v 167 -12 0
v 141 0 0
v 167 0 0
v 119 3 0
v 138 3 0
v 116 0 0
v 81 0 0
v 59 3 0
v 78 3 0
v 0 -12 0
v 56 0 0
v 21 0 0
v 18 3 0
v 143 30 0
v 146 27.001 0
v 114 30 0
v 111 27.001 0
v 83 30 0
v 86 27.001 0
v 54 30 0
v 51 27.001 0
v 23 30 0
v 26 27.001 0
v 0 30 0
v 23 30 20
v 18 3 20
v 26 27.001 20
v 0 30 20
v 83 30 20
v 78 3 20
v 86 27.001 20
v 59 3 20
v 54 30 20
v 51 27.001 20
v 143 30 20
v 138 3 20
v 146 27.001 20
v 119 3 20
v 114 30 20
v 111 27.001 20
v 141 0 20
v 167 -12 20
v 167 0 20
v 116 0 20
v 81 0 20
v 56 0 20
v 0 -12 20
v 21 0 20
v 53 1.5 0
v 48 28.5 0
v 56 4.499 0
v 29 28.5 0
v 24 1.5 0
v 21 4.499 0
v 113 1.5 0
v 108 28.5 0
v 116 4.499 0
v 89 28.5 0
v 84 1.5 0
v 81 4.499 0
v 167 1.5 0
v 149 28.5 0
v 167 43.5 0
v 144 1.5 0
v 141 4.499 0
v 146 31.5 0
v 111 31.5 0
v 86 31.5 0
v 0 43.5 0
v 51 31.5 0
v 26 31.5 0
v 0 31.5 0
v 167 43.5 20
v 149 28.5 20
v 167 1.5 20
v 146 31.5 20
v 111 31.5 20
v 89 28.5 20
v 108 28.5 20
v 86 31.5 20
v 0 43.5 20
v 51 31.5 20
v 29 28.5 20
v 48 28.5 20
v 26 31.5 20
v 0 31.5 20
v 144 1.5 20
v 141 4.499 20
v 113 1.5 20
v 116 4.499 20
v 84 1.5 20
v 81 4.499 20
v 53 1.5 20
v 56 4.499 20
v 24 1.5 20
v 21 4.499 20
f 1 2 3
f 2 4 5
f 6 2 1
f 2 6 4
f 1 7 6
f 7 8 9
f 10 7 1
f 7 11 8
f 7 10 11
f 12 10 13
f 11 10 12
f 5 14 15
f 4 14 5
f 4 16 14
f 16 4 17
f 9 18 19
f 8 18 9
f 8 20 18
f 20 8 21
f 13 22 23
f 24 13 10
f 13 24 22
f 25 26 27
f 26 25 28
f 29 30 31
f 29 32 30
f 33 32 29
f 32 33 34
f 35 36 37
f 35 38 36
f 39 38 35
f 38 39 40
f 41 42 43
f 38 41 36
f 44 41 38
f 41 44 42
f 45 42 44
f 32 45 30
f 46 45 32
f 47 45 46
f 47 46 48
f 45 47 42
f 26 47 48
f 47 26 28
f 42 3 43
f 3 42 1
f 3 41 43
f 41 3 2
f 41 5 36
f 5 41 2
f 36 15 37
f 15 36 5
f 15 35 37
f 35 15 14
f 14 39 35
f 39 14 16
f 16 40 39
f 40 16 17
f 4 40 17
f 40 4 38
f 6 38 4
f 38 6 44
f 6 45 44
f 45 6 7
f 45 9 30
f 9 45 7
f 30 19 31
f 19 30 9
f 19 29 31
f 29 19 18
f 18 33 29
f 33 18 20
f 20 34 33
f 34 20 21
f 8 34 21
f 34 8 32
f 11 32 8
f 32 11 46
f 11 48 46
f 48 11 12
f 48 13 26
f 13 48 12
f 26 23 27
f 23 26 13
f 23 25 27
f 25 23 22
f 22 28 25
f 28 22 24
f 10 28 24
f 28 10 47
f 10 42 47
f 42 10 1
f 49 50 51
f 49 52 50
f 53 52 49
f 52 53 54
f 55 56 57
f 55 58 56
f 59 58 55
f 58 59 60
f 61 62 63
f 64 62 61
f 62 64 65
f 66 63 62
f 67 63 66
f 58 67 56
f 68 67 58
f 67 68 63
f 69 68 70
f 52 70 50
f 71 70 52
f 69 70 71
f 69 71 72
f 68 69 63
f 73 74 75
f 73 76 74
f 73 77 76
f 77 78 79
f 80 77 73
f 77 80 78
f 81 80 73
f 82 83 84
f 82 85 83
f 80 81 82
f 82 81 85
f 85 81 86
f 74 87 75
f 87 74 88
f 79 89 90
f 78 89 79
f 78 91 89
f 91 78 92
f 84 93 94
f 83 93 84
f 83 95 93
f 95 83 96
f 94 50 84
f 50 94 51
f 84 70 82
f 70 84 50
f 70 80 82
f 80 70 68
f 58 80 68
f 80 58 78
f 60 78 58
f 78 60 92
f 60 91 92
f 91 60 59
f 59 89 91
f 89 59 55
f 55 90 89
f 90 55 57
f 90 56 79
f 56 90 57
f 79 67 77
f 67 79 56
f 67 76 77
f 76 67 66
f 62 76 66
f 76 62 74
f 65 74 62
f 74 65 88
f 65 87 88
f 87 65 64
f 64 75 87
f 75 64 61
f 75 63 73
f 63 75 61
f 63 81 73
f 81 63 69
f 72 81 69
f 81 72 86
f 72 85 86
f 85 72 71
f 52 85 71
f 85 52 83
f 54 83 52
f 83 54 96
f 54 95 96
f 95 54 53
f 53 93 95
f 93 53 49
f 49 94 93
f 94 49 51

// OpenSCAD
tail_length = 30;
base_width = 17;
overhang_width = 10;
tails=2;
chamf = 4;
e = 0.001;
tol= 3;
anchor_length = 12;
step_width = (2*base_width+ 2*overhang_width + 2*tol);


module dove_overhang() {
    points = [
        [0,0],
        [0,tail_length],
        [overhang_width,tail_length],
    ];
    points_chamf  = [
        [overhang_width+e,tail_length+e],
        [overhang_width+e,tail_length-chamf+e],
        [overhang_width-chamf-e,tail_length+e]];
    points_chamf_base= [
        [0,chamf],
        [0,0],
        [chamf,0]];
    difference(){
        polygon(points);
        polygon(points_chamf);
    }  
    polygon(points_chamf_base);
}


module dove_body(){
    polygon([
        [0,0],
        [0,tail_length],
        [base_width,tail_length],
        [base_width,0]
    ]);  
}

module dove_tail(){
    translate([overhang_width,0])
    dove_body();
    translate([overhang_width+base_width,0])
    dove_overhang();

    mirror([1,0,0])
    translate([-overhang_width,0])
    dove_overhang();
}

module dove_tail_end(){
    dove_body();
    translate([base_width,0])
    dove_overhang();
}

module tailrow(inner_tail_count){
    for(i=[0:inner_tail_count-1]){
        translate([i* step_width , 0, 0])
        dove_tail();
    }
}

module side (has_end, has_start, inner_tail_count){
    // todo: depending on "has_end" and "has_start" the total width should vary
    
    total_width = 2*base_width + 1*overhang_width + 1*tol 
                + inner_tail_count*step_width;
    
    if (has_start){
        translate([0,0,0])
        dove_tail_end();
        
        translate([1*overhang_width +2* base_width +2* tol ,0,0])
        tailrow(inner_tail_count);
    }else {
        translate([ base_width + tol ,0,0])
        tailrow(inner_tail_count);
    }
    
    if (has_end){
        translate([ total_width ,0,0])
        mirror([1,0,0])
        dove_tail_end();
    }

    translate([0,-anchor_length])
    square([total_width,anchor_length]);
}

color("green") 
linear_extrude(height = 20)
side(has_end=false, has_start=true, inner_tail_count=tails);;

color("orange", alpha=0.3)
linear_extrude(height = 20)
translate([0 ,tail_length + tol/2,0])
mirror([0,1,0])
side(has_end = true, has_start =false, inner_tail_count=tails);
